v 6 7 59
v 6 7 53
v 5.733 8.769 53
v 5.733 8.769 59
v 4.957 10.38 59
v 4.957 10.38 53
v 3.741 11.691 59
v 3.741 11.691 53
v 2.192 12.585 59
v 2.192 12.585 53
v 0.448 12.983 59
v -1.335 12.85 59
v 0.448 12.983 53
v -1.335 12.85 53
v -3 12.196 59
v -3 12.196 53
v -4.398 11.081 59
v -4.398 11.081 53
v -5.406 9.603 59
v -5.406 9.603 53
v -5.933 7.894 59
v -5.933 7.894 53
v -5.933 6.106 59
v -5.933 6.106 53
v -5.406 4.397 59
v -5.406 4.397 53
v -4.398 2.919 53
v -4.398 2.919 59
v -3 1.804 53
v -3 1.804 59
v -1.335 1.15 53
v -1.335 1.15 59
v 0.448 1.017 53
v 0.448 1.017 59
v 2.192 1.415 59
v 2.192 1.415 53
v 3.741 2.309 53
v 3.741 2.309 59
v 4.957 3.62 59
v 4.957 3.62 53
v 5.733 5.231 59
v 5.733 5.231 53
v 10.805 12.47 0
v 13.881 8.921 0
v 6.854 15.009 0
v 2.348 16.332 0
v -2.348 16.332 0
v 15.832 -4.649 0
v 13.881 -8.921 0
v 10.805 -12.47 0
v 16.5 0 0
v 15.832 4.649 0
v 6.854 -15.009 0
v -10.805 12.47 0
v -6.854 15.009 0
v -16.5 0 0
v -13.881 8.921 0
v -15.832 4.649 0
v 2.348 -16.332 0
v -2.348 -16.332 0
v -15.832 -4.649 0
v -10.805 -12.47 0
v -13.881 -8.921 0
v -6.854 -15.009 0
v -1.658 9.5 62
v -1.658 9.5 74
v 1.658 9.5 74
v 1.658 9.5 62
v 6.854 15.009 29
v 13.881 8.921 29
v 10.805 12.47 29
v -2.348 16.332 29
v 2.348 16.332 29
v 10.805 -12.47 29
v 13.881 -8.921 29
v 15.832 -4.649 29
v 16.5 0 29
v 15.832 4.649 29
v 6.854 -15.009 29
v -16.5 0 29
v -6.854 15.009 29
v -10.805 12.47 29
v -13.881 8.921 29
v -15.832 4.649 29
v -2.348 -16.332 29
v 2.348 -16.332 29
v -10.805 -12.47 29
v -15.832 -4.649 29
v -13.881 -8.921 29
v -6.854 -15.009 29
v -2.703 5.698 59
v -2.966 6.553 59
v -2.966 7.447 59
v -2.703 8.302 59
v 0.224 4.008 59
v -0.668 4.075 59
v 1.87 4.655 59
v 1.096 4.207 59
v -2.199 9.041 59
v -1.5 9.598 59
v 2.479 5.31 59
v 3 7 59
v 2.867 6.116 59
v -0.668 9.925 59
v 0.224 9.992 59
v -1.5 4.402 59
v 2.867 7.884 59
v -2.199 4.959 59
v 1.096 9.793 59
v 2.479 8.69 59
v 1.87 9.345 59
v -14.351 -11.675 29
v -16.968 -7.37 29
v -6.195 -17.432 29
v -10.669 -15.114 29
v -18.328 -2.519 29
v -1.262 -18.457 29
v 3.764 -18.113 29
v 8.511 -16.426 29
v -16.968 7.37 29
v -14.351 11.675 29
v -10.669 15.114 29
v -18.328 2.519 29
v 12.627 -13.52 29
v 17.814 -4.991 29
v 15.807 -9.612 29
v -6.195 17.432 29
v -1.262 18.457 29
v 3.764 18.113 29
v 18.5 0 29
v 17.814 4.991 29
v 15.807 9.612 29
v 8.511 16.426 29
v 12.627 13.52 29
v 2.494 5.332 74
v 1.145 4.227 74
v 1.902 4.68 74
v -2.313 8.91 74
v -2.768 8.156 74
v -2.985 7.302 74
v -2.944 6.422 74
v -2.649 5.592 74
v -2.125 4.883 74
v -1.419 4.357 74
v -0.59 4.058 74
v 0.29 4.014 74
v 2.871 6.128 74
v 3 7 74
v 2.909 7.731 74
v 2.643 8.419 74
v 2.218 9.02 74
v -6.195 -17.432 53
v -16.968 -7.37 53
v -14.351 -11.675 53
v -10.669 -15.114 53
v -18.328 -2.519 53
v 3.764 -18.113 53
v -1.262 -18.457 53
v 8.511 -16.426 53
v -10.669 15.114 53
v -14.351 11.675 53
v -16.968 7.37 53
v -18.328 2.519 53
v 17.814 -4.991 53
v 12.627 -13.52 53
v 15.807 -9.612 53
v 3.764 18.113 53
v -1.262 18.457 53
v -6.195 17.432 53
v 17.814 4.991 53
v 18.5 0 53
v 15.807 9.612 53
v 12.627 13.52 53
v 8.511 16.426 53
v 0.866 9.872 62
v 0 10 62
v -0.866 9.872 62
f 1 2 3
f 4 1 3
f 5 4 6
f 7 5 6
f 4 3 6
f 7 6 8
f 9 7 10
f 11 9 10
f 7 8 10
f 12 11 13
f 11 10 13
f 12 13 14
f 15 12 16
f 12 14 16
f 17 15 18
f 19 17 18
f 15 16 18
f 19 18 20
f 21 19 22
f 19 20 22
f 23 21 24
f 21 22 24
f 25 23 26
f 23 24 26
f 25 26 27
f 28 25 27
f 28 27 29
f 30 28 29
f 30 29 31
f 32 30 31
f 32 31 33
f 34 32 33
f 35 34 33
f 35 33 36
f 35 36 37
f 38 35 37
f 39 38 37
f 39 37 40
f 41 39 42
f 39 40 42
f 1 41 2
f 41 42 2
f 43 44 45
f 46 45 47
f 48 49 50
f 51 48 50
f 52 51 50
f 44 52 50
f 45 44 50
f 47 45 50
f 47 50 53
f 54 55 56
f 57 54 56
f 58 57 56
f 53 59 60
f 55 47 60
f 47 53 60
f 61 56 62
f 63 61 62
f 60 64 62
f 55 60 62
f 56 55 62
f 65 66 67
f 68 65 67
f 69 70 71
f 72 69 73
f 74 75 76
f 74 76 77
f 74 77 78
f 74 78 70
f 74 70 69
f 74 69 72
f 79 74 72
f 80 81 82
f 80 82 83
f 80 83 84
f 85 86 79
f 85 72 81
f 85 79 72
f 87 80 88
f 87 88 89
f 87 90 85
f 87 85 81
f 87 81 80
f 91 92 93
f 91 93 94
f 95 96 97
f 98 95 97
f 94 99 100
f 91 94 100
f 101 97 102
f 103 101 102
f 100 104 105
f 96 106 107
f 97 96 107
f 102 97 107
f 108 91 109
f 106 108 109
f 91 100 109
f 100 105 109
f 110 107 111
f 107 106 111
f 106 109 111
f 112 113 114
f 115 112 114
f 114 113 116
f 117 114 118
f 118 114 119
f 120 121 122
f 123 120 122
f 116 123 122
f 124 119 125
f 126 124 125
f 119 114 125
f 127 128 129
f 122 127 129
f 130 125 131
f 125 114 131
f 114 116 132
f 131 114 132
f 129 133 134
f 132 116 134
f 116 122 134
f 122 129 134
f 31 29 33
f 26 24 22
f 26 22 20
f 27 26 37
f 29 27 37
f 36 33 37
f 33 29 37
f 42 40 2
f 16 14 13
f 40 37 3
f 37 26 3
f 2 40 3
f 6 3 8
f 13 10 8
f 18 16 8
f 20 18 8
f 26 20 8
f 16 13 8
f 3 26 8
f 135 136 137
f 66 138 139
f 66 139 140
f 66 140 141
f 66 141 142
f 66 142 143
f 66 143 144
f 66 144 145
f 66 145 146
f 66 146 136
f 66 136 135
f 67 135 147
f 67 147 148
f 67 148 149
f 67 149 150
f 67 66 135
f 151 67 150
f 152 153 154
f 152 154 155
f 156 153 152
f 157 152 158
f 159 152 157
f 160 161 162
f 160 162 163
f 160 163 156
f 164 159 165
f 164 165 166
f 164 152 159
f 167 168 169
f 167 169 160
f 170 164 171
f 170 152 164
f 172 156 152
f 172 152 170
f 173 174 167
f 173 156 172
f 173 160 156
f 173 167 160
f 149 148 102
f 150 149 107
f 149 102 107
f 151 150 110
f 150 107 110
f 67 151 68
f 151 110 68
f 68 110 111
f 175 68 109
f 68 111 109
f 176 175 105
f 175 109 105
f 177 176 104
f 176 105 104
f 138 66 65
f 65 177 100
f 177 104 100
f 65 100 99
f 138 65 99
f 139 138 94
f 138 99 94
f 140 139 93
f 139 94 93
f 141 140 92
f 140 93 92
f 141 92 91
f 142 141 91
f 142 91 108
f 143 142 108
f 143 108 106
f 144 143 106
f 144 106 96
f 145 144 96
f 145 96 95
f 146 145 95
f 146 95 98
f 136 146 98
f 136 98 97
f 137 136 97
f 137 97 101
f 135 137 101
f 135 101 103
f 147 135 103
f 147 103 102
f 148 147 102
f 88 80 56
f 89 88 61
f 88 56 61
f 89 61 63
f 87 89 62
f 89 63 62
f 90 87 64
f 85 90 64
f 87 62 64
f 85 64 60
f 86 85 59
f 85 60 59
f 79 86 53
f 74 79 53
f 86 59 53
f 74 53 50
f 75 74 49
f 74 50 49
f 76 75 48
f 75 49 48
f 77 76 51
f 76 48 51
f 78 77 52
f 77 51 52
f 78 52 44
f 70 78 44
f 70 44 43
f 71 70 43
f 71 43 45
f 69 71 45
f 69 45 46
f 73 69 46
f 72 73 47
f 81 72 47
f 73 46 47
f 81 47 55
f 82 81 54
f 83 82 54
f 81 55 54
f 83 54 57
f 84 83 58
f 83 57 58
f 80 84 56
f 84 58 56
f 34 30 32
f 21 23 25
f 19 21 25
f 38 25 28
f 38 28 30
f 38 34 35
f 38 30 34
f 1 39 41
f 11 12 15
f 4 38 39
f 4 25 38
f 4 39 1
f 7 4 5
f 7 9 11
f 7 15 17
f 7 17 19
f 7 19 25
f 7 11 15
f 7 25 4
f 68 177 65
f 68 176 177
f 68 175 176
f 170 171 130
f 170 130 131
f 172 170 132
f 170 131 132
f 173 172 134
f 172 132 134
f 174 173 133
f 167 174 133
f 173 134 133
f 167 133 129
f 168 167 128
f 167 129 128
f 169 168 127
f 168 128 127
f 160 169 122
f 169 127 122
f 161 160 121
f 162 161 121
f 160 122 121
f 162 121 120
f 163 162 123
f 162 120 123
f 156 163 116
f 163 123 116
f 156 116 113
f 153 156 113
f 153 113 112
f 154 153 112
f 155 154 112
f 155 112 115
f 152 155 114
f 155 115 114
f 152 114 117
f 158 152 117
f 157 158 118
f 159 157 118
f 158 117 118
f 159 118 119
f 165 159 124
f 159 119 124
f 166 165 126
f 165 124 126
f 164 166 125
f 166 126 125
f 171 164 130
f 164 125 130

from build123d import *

# Parameters (mm, degrees)
SKIZZE1_R                       = 16.5
AUFSATZ_LINEAR_AUSTRAGEN1_DEPTH = 29
SKIZZE2_R                       = 18.5
AUFSATZ_LINEAR_AUSTRAGEN2_DEPTH = 24
SKIZZE3_R                       = 6
AUFSATZ_LINEAR_AUSTRAGEN3_DEPTH = 6
SKIZZE4_R                       = 3
AUFSATZ_LINEAR_AUSTRAGEN4_DEPTH = 15
SKIZZE5_W                       = 5.984100999
SKIZZE5_H                       = 2.255405848
SCHNITT_LINEAR_AUSTRAGEN1_DEPTH = 12


with BuildPart() as part:
    # Skizze1 → Aufsatz-Linear austragen1 (new body)
    with BuildSketch(Plane(origin=(0, 0, 0), x_dir=(0, 1, 0), z_dir=(0, 0, 1))):
        with Locations(Location((0, 0, 0), (0, 0, 90))):
            Circle(SKIZZE1_R)
    extrude(amount=AUFSATZ_LINEAR_AUSTRAGEN1_DEPTH)


with BuildPart() as body_2:
    # Skizze2 → Aufsatz-Linear austragen2 (new body)
    with BuildSketch(Plane.XY.offset(29)):
        Circle(SKIZZE2_R)
    extrude(amount=AUFSATZ_LINEAR_AUSTRAGEN2_DEPTH)


with BuildPart() as body_3:
    # Skizze3 → Aufsatz-Linear austragen3 (new body)
    with BuildSketch(Plane.XY.offset(53)):
        with Locations((0, 7)):
            Circle(SKIZZE3_R)
    extrude(amount=AUFSATZ_LINEAR_AUSTRAGEN3_DEPTH)


with BuildPart() as body_4:
    # Skizze4 → Aufsatz-Linear austragen4 (new body)
    with BuildSketch(Plane.XY.offset(59)):
        with Locations((0, 7)):
            Circle(SKIZZE4_R)
    extrude(amount=AUFSATZ_LINEAR_AUSTRAGEN4_DEPTH)

    # Skizze5 → Schnitt-Linear austragen1 (cut)
    with BuildSketch(Plane.XY.offset(74)):
        with Locations((0.183083145, 10.627702924)):
            Rectangle(SKIZZE5_W, SKIZZE5_H)
    extrude(amount=-SCHNITT_LINEAR_AUSTRAGEN1_DEPTH, mode=Mode.SUBTRACT)


solid = Compound([part.part, body_2.part, body_3.part, body_4.part])
